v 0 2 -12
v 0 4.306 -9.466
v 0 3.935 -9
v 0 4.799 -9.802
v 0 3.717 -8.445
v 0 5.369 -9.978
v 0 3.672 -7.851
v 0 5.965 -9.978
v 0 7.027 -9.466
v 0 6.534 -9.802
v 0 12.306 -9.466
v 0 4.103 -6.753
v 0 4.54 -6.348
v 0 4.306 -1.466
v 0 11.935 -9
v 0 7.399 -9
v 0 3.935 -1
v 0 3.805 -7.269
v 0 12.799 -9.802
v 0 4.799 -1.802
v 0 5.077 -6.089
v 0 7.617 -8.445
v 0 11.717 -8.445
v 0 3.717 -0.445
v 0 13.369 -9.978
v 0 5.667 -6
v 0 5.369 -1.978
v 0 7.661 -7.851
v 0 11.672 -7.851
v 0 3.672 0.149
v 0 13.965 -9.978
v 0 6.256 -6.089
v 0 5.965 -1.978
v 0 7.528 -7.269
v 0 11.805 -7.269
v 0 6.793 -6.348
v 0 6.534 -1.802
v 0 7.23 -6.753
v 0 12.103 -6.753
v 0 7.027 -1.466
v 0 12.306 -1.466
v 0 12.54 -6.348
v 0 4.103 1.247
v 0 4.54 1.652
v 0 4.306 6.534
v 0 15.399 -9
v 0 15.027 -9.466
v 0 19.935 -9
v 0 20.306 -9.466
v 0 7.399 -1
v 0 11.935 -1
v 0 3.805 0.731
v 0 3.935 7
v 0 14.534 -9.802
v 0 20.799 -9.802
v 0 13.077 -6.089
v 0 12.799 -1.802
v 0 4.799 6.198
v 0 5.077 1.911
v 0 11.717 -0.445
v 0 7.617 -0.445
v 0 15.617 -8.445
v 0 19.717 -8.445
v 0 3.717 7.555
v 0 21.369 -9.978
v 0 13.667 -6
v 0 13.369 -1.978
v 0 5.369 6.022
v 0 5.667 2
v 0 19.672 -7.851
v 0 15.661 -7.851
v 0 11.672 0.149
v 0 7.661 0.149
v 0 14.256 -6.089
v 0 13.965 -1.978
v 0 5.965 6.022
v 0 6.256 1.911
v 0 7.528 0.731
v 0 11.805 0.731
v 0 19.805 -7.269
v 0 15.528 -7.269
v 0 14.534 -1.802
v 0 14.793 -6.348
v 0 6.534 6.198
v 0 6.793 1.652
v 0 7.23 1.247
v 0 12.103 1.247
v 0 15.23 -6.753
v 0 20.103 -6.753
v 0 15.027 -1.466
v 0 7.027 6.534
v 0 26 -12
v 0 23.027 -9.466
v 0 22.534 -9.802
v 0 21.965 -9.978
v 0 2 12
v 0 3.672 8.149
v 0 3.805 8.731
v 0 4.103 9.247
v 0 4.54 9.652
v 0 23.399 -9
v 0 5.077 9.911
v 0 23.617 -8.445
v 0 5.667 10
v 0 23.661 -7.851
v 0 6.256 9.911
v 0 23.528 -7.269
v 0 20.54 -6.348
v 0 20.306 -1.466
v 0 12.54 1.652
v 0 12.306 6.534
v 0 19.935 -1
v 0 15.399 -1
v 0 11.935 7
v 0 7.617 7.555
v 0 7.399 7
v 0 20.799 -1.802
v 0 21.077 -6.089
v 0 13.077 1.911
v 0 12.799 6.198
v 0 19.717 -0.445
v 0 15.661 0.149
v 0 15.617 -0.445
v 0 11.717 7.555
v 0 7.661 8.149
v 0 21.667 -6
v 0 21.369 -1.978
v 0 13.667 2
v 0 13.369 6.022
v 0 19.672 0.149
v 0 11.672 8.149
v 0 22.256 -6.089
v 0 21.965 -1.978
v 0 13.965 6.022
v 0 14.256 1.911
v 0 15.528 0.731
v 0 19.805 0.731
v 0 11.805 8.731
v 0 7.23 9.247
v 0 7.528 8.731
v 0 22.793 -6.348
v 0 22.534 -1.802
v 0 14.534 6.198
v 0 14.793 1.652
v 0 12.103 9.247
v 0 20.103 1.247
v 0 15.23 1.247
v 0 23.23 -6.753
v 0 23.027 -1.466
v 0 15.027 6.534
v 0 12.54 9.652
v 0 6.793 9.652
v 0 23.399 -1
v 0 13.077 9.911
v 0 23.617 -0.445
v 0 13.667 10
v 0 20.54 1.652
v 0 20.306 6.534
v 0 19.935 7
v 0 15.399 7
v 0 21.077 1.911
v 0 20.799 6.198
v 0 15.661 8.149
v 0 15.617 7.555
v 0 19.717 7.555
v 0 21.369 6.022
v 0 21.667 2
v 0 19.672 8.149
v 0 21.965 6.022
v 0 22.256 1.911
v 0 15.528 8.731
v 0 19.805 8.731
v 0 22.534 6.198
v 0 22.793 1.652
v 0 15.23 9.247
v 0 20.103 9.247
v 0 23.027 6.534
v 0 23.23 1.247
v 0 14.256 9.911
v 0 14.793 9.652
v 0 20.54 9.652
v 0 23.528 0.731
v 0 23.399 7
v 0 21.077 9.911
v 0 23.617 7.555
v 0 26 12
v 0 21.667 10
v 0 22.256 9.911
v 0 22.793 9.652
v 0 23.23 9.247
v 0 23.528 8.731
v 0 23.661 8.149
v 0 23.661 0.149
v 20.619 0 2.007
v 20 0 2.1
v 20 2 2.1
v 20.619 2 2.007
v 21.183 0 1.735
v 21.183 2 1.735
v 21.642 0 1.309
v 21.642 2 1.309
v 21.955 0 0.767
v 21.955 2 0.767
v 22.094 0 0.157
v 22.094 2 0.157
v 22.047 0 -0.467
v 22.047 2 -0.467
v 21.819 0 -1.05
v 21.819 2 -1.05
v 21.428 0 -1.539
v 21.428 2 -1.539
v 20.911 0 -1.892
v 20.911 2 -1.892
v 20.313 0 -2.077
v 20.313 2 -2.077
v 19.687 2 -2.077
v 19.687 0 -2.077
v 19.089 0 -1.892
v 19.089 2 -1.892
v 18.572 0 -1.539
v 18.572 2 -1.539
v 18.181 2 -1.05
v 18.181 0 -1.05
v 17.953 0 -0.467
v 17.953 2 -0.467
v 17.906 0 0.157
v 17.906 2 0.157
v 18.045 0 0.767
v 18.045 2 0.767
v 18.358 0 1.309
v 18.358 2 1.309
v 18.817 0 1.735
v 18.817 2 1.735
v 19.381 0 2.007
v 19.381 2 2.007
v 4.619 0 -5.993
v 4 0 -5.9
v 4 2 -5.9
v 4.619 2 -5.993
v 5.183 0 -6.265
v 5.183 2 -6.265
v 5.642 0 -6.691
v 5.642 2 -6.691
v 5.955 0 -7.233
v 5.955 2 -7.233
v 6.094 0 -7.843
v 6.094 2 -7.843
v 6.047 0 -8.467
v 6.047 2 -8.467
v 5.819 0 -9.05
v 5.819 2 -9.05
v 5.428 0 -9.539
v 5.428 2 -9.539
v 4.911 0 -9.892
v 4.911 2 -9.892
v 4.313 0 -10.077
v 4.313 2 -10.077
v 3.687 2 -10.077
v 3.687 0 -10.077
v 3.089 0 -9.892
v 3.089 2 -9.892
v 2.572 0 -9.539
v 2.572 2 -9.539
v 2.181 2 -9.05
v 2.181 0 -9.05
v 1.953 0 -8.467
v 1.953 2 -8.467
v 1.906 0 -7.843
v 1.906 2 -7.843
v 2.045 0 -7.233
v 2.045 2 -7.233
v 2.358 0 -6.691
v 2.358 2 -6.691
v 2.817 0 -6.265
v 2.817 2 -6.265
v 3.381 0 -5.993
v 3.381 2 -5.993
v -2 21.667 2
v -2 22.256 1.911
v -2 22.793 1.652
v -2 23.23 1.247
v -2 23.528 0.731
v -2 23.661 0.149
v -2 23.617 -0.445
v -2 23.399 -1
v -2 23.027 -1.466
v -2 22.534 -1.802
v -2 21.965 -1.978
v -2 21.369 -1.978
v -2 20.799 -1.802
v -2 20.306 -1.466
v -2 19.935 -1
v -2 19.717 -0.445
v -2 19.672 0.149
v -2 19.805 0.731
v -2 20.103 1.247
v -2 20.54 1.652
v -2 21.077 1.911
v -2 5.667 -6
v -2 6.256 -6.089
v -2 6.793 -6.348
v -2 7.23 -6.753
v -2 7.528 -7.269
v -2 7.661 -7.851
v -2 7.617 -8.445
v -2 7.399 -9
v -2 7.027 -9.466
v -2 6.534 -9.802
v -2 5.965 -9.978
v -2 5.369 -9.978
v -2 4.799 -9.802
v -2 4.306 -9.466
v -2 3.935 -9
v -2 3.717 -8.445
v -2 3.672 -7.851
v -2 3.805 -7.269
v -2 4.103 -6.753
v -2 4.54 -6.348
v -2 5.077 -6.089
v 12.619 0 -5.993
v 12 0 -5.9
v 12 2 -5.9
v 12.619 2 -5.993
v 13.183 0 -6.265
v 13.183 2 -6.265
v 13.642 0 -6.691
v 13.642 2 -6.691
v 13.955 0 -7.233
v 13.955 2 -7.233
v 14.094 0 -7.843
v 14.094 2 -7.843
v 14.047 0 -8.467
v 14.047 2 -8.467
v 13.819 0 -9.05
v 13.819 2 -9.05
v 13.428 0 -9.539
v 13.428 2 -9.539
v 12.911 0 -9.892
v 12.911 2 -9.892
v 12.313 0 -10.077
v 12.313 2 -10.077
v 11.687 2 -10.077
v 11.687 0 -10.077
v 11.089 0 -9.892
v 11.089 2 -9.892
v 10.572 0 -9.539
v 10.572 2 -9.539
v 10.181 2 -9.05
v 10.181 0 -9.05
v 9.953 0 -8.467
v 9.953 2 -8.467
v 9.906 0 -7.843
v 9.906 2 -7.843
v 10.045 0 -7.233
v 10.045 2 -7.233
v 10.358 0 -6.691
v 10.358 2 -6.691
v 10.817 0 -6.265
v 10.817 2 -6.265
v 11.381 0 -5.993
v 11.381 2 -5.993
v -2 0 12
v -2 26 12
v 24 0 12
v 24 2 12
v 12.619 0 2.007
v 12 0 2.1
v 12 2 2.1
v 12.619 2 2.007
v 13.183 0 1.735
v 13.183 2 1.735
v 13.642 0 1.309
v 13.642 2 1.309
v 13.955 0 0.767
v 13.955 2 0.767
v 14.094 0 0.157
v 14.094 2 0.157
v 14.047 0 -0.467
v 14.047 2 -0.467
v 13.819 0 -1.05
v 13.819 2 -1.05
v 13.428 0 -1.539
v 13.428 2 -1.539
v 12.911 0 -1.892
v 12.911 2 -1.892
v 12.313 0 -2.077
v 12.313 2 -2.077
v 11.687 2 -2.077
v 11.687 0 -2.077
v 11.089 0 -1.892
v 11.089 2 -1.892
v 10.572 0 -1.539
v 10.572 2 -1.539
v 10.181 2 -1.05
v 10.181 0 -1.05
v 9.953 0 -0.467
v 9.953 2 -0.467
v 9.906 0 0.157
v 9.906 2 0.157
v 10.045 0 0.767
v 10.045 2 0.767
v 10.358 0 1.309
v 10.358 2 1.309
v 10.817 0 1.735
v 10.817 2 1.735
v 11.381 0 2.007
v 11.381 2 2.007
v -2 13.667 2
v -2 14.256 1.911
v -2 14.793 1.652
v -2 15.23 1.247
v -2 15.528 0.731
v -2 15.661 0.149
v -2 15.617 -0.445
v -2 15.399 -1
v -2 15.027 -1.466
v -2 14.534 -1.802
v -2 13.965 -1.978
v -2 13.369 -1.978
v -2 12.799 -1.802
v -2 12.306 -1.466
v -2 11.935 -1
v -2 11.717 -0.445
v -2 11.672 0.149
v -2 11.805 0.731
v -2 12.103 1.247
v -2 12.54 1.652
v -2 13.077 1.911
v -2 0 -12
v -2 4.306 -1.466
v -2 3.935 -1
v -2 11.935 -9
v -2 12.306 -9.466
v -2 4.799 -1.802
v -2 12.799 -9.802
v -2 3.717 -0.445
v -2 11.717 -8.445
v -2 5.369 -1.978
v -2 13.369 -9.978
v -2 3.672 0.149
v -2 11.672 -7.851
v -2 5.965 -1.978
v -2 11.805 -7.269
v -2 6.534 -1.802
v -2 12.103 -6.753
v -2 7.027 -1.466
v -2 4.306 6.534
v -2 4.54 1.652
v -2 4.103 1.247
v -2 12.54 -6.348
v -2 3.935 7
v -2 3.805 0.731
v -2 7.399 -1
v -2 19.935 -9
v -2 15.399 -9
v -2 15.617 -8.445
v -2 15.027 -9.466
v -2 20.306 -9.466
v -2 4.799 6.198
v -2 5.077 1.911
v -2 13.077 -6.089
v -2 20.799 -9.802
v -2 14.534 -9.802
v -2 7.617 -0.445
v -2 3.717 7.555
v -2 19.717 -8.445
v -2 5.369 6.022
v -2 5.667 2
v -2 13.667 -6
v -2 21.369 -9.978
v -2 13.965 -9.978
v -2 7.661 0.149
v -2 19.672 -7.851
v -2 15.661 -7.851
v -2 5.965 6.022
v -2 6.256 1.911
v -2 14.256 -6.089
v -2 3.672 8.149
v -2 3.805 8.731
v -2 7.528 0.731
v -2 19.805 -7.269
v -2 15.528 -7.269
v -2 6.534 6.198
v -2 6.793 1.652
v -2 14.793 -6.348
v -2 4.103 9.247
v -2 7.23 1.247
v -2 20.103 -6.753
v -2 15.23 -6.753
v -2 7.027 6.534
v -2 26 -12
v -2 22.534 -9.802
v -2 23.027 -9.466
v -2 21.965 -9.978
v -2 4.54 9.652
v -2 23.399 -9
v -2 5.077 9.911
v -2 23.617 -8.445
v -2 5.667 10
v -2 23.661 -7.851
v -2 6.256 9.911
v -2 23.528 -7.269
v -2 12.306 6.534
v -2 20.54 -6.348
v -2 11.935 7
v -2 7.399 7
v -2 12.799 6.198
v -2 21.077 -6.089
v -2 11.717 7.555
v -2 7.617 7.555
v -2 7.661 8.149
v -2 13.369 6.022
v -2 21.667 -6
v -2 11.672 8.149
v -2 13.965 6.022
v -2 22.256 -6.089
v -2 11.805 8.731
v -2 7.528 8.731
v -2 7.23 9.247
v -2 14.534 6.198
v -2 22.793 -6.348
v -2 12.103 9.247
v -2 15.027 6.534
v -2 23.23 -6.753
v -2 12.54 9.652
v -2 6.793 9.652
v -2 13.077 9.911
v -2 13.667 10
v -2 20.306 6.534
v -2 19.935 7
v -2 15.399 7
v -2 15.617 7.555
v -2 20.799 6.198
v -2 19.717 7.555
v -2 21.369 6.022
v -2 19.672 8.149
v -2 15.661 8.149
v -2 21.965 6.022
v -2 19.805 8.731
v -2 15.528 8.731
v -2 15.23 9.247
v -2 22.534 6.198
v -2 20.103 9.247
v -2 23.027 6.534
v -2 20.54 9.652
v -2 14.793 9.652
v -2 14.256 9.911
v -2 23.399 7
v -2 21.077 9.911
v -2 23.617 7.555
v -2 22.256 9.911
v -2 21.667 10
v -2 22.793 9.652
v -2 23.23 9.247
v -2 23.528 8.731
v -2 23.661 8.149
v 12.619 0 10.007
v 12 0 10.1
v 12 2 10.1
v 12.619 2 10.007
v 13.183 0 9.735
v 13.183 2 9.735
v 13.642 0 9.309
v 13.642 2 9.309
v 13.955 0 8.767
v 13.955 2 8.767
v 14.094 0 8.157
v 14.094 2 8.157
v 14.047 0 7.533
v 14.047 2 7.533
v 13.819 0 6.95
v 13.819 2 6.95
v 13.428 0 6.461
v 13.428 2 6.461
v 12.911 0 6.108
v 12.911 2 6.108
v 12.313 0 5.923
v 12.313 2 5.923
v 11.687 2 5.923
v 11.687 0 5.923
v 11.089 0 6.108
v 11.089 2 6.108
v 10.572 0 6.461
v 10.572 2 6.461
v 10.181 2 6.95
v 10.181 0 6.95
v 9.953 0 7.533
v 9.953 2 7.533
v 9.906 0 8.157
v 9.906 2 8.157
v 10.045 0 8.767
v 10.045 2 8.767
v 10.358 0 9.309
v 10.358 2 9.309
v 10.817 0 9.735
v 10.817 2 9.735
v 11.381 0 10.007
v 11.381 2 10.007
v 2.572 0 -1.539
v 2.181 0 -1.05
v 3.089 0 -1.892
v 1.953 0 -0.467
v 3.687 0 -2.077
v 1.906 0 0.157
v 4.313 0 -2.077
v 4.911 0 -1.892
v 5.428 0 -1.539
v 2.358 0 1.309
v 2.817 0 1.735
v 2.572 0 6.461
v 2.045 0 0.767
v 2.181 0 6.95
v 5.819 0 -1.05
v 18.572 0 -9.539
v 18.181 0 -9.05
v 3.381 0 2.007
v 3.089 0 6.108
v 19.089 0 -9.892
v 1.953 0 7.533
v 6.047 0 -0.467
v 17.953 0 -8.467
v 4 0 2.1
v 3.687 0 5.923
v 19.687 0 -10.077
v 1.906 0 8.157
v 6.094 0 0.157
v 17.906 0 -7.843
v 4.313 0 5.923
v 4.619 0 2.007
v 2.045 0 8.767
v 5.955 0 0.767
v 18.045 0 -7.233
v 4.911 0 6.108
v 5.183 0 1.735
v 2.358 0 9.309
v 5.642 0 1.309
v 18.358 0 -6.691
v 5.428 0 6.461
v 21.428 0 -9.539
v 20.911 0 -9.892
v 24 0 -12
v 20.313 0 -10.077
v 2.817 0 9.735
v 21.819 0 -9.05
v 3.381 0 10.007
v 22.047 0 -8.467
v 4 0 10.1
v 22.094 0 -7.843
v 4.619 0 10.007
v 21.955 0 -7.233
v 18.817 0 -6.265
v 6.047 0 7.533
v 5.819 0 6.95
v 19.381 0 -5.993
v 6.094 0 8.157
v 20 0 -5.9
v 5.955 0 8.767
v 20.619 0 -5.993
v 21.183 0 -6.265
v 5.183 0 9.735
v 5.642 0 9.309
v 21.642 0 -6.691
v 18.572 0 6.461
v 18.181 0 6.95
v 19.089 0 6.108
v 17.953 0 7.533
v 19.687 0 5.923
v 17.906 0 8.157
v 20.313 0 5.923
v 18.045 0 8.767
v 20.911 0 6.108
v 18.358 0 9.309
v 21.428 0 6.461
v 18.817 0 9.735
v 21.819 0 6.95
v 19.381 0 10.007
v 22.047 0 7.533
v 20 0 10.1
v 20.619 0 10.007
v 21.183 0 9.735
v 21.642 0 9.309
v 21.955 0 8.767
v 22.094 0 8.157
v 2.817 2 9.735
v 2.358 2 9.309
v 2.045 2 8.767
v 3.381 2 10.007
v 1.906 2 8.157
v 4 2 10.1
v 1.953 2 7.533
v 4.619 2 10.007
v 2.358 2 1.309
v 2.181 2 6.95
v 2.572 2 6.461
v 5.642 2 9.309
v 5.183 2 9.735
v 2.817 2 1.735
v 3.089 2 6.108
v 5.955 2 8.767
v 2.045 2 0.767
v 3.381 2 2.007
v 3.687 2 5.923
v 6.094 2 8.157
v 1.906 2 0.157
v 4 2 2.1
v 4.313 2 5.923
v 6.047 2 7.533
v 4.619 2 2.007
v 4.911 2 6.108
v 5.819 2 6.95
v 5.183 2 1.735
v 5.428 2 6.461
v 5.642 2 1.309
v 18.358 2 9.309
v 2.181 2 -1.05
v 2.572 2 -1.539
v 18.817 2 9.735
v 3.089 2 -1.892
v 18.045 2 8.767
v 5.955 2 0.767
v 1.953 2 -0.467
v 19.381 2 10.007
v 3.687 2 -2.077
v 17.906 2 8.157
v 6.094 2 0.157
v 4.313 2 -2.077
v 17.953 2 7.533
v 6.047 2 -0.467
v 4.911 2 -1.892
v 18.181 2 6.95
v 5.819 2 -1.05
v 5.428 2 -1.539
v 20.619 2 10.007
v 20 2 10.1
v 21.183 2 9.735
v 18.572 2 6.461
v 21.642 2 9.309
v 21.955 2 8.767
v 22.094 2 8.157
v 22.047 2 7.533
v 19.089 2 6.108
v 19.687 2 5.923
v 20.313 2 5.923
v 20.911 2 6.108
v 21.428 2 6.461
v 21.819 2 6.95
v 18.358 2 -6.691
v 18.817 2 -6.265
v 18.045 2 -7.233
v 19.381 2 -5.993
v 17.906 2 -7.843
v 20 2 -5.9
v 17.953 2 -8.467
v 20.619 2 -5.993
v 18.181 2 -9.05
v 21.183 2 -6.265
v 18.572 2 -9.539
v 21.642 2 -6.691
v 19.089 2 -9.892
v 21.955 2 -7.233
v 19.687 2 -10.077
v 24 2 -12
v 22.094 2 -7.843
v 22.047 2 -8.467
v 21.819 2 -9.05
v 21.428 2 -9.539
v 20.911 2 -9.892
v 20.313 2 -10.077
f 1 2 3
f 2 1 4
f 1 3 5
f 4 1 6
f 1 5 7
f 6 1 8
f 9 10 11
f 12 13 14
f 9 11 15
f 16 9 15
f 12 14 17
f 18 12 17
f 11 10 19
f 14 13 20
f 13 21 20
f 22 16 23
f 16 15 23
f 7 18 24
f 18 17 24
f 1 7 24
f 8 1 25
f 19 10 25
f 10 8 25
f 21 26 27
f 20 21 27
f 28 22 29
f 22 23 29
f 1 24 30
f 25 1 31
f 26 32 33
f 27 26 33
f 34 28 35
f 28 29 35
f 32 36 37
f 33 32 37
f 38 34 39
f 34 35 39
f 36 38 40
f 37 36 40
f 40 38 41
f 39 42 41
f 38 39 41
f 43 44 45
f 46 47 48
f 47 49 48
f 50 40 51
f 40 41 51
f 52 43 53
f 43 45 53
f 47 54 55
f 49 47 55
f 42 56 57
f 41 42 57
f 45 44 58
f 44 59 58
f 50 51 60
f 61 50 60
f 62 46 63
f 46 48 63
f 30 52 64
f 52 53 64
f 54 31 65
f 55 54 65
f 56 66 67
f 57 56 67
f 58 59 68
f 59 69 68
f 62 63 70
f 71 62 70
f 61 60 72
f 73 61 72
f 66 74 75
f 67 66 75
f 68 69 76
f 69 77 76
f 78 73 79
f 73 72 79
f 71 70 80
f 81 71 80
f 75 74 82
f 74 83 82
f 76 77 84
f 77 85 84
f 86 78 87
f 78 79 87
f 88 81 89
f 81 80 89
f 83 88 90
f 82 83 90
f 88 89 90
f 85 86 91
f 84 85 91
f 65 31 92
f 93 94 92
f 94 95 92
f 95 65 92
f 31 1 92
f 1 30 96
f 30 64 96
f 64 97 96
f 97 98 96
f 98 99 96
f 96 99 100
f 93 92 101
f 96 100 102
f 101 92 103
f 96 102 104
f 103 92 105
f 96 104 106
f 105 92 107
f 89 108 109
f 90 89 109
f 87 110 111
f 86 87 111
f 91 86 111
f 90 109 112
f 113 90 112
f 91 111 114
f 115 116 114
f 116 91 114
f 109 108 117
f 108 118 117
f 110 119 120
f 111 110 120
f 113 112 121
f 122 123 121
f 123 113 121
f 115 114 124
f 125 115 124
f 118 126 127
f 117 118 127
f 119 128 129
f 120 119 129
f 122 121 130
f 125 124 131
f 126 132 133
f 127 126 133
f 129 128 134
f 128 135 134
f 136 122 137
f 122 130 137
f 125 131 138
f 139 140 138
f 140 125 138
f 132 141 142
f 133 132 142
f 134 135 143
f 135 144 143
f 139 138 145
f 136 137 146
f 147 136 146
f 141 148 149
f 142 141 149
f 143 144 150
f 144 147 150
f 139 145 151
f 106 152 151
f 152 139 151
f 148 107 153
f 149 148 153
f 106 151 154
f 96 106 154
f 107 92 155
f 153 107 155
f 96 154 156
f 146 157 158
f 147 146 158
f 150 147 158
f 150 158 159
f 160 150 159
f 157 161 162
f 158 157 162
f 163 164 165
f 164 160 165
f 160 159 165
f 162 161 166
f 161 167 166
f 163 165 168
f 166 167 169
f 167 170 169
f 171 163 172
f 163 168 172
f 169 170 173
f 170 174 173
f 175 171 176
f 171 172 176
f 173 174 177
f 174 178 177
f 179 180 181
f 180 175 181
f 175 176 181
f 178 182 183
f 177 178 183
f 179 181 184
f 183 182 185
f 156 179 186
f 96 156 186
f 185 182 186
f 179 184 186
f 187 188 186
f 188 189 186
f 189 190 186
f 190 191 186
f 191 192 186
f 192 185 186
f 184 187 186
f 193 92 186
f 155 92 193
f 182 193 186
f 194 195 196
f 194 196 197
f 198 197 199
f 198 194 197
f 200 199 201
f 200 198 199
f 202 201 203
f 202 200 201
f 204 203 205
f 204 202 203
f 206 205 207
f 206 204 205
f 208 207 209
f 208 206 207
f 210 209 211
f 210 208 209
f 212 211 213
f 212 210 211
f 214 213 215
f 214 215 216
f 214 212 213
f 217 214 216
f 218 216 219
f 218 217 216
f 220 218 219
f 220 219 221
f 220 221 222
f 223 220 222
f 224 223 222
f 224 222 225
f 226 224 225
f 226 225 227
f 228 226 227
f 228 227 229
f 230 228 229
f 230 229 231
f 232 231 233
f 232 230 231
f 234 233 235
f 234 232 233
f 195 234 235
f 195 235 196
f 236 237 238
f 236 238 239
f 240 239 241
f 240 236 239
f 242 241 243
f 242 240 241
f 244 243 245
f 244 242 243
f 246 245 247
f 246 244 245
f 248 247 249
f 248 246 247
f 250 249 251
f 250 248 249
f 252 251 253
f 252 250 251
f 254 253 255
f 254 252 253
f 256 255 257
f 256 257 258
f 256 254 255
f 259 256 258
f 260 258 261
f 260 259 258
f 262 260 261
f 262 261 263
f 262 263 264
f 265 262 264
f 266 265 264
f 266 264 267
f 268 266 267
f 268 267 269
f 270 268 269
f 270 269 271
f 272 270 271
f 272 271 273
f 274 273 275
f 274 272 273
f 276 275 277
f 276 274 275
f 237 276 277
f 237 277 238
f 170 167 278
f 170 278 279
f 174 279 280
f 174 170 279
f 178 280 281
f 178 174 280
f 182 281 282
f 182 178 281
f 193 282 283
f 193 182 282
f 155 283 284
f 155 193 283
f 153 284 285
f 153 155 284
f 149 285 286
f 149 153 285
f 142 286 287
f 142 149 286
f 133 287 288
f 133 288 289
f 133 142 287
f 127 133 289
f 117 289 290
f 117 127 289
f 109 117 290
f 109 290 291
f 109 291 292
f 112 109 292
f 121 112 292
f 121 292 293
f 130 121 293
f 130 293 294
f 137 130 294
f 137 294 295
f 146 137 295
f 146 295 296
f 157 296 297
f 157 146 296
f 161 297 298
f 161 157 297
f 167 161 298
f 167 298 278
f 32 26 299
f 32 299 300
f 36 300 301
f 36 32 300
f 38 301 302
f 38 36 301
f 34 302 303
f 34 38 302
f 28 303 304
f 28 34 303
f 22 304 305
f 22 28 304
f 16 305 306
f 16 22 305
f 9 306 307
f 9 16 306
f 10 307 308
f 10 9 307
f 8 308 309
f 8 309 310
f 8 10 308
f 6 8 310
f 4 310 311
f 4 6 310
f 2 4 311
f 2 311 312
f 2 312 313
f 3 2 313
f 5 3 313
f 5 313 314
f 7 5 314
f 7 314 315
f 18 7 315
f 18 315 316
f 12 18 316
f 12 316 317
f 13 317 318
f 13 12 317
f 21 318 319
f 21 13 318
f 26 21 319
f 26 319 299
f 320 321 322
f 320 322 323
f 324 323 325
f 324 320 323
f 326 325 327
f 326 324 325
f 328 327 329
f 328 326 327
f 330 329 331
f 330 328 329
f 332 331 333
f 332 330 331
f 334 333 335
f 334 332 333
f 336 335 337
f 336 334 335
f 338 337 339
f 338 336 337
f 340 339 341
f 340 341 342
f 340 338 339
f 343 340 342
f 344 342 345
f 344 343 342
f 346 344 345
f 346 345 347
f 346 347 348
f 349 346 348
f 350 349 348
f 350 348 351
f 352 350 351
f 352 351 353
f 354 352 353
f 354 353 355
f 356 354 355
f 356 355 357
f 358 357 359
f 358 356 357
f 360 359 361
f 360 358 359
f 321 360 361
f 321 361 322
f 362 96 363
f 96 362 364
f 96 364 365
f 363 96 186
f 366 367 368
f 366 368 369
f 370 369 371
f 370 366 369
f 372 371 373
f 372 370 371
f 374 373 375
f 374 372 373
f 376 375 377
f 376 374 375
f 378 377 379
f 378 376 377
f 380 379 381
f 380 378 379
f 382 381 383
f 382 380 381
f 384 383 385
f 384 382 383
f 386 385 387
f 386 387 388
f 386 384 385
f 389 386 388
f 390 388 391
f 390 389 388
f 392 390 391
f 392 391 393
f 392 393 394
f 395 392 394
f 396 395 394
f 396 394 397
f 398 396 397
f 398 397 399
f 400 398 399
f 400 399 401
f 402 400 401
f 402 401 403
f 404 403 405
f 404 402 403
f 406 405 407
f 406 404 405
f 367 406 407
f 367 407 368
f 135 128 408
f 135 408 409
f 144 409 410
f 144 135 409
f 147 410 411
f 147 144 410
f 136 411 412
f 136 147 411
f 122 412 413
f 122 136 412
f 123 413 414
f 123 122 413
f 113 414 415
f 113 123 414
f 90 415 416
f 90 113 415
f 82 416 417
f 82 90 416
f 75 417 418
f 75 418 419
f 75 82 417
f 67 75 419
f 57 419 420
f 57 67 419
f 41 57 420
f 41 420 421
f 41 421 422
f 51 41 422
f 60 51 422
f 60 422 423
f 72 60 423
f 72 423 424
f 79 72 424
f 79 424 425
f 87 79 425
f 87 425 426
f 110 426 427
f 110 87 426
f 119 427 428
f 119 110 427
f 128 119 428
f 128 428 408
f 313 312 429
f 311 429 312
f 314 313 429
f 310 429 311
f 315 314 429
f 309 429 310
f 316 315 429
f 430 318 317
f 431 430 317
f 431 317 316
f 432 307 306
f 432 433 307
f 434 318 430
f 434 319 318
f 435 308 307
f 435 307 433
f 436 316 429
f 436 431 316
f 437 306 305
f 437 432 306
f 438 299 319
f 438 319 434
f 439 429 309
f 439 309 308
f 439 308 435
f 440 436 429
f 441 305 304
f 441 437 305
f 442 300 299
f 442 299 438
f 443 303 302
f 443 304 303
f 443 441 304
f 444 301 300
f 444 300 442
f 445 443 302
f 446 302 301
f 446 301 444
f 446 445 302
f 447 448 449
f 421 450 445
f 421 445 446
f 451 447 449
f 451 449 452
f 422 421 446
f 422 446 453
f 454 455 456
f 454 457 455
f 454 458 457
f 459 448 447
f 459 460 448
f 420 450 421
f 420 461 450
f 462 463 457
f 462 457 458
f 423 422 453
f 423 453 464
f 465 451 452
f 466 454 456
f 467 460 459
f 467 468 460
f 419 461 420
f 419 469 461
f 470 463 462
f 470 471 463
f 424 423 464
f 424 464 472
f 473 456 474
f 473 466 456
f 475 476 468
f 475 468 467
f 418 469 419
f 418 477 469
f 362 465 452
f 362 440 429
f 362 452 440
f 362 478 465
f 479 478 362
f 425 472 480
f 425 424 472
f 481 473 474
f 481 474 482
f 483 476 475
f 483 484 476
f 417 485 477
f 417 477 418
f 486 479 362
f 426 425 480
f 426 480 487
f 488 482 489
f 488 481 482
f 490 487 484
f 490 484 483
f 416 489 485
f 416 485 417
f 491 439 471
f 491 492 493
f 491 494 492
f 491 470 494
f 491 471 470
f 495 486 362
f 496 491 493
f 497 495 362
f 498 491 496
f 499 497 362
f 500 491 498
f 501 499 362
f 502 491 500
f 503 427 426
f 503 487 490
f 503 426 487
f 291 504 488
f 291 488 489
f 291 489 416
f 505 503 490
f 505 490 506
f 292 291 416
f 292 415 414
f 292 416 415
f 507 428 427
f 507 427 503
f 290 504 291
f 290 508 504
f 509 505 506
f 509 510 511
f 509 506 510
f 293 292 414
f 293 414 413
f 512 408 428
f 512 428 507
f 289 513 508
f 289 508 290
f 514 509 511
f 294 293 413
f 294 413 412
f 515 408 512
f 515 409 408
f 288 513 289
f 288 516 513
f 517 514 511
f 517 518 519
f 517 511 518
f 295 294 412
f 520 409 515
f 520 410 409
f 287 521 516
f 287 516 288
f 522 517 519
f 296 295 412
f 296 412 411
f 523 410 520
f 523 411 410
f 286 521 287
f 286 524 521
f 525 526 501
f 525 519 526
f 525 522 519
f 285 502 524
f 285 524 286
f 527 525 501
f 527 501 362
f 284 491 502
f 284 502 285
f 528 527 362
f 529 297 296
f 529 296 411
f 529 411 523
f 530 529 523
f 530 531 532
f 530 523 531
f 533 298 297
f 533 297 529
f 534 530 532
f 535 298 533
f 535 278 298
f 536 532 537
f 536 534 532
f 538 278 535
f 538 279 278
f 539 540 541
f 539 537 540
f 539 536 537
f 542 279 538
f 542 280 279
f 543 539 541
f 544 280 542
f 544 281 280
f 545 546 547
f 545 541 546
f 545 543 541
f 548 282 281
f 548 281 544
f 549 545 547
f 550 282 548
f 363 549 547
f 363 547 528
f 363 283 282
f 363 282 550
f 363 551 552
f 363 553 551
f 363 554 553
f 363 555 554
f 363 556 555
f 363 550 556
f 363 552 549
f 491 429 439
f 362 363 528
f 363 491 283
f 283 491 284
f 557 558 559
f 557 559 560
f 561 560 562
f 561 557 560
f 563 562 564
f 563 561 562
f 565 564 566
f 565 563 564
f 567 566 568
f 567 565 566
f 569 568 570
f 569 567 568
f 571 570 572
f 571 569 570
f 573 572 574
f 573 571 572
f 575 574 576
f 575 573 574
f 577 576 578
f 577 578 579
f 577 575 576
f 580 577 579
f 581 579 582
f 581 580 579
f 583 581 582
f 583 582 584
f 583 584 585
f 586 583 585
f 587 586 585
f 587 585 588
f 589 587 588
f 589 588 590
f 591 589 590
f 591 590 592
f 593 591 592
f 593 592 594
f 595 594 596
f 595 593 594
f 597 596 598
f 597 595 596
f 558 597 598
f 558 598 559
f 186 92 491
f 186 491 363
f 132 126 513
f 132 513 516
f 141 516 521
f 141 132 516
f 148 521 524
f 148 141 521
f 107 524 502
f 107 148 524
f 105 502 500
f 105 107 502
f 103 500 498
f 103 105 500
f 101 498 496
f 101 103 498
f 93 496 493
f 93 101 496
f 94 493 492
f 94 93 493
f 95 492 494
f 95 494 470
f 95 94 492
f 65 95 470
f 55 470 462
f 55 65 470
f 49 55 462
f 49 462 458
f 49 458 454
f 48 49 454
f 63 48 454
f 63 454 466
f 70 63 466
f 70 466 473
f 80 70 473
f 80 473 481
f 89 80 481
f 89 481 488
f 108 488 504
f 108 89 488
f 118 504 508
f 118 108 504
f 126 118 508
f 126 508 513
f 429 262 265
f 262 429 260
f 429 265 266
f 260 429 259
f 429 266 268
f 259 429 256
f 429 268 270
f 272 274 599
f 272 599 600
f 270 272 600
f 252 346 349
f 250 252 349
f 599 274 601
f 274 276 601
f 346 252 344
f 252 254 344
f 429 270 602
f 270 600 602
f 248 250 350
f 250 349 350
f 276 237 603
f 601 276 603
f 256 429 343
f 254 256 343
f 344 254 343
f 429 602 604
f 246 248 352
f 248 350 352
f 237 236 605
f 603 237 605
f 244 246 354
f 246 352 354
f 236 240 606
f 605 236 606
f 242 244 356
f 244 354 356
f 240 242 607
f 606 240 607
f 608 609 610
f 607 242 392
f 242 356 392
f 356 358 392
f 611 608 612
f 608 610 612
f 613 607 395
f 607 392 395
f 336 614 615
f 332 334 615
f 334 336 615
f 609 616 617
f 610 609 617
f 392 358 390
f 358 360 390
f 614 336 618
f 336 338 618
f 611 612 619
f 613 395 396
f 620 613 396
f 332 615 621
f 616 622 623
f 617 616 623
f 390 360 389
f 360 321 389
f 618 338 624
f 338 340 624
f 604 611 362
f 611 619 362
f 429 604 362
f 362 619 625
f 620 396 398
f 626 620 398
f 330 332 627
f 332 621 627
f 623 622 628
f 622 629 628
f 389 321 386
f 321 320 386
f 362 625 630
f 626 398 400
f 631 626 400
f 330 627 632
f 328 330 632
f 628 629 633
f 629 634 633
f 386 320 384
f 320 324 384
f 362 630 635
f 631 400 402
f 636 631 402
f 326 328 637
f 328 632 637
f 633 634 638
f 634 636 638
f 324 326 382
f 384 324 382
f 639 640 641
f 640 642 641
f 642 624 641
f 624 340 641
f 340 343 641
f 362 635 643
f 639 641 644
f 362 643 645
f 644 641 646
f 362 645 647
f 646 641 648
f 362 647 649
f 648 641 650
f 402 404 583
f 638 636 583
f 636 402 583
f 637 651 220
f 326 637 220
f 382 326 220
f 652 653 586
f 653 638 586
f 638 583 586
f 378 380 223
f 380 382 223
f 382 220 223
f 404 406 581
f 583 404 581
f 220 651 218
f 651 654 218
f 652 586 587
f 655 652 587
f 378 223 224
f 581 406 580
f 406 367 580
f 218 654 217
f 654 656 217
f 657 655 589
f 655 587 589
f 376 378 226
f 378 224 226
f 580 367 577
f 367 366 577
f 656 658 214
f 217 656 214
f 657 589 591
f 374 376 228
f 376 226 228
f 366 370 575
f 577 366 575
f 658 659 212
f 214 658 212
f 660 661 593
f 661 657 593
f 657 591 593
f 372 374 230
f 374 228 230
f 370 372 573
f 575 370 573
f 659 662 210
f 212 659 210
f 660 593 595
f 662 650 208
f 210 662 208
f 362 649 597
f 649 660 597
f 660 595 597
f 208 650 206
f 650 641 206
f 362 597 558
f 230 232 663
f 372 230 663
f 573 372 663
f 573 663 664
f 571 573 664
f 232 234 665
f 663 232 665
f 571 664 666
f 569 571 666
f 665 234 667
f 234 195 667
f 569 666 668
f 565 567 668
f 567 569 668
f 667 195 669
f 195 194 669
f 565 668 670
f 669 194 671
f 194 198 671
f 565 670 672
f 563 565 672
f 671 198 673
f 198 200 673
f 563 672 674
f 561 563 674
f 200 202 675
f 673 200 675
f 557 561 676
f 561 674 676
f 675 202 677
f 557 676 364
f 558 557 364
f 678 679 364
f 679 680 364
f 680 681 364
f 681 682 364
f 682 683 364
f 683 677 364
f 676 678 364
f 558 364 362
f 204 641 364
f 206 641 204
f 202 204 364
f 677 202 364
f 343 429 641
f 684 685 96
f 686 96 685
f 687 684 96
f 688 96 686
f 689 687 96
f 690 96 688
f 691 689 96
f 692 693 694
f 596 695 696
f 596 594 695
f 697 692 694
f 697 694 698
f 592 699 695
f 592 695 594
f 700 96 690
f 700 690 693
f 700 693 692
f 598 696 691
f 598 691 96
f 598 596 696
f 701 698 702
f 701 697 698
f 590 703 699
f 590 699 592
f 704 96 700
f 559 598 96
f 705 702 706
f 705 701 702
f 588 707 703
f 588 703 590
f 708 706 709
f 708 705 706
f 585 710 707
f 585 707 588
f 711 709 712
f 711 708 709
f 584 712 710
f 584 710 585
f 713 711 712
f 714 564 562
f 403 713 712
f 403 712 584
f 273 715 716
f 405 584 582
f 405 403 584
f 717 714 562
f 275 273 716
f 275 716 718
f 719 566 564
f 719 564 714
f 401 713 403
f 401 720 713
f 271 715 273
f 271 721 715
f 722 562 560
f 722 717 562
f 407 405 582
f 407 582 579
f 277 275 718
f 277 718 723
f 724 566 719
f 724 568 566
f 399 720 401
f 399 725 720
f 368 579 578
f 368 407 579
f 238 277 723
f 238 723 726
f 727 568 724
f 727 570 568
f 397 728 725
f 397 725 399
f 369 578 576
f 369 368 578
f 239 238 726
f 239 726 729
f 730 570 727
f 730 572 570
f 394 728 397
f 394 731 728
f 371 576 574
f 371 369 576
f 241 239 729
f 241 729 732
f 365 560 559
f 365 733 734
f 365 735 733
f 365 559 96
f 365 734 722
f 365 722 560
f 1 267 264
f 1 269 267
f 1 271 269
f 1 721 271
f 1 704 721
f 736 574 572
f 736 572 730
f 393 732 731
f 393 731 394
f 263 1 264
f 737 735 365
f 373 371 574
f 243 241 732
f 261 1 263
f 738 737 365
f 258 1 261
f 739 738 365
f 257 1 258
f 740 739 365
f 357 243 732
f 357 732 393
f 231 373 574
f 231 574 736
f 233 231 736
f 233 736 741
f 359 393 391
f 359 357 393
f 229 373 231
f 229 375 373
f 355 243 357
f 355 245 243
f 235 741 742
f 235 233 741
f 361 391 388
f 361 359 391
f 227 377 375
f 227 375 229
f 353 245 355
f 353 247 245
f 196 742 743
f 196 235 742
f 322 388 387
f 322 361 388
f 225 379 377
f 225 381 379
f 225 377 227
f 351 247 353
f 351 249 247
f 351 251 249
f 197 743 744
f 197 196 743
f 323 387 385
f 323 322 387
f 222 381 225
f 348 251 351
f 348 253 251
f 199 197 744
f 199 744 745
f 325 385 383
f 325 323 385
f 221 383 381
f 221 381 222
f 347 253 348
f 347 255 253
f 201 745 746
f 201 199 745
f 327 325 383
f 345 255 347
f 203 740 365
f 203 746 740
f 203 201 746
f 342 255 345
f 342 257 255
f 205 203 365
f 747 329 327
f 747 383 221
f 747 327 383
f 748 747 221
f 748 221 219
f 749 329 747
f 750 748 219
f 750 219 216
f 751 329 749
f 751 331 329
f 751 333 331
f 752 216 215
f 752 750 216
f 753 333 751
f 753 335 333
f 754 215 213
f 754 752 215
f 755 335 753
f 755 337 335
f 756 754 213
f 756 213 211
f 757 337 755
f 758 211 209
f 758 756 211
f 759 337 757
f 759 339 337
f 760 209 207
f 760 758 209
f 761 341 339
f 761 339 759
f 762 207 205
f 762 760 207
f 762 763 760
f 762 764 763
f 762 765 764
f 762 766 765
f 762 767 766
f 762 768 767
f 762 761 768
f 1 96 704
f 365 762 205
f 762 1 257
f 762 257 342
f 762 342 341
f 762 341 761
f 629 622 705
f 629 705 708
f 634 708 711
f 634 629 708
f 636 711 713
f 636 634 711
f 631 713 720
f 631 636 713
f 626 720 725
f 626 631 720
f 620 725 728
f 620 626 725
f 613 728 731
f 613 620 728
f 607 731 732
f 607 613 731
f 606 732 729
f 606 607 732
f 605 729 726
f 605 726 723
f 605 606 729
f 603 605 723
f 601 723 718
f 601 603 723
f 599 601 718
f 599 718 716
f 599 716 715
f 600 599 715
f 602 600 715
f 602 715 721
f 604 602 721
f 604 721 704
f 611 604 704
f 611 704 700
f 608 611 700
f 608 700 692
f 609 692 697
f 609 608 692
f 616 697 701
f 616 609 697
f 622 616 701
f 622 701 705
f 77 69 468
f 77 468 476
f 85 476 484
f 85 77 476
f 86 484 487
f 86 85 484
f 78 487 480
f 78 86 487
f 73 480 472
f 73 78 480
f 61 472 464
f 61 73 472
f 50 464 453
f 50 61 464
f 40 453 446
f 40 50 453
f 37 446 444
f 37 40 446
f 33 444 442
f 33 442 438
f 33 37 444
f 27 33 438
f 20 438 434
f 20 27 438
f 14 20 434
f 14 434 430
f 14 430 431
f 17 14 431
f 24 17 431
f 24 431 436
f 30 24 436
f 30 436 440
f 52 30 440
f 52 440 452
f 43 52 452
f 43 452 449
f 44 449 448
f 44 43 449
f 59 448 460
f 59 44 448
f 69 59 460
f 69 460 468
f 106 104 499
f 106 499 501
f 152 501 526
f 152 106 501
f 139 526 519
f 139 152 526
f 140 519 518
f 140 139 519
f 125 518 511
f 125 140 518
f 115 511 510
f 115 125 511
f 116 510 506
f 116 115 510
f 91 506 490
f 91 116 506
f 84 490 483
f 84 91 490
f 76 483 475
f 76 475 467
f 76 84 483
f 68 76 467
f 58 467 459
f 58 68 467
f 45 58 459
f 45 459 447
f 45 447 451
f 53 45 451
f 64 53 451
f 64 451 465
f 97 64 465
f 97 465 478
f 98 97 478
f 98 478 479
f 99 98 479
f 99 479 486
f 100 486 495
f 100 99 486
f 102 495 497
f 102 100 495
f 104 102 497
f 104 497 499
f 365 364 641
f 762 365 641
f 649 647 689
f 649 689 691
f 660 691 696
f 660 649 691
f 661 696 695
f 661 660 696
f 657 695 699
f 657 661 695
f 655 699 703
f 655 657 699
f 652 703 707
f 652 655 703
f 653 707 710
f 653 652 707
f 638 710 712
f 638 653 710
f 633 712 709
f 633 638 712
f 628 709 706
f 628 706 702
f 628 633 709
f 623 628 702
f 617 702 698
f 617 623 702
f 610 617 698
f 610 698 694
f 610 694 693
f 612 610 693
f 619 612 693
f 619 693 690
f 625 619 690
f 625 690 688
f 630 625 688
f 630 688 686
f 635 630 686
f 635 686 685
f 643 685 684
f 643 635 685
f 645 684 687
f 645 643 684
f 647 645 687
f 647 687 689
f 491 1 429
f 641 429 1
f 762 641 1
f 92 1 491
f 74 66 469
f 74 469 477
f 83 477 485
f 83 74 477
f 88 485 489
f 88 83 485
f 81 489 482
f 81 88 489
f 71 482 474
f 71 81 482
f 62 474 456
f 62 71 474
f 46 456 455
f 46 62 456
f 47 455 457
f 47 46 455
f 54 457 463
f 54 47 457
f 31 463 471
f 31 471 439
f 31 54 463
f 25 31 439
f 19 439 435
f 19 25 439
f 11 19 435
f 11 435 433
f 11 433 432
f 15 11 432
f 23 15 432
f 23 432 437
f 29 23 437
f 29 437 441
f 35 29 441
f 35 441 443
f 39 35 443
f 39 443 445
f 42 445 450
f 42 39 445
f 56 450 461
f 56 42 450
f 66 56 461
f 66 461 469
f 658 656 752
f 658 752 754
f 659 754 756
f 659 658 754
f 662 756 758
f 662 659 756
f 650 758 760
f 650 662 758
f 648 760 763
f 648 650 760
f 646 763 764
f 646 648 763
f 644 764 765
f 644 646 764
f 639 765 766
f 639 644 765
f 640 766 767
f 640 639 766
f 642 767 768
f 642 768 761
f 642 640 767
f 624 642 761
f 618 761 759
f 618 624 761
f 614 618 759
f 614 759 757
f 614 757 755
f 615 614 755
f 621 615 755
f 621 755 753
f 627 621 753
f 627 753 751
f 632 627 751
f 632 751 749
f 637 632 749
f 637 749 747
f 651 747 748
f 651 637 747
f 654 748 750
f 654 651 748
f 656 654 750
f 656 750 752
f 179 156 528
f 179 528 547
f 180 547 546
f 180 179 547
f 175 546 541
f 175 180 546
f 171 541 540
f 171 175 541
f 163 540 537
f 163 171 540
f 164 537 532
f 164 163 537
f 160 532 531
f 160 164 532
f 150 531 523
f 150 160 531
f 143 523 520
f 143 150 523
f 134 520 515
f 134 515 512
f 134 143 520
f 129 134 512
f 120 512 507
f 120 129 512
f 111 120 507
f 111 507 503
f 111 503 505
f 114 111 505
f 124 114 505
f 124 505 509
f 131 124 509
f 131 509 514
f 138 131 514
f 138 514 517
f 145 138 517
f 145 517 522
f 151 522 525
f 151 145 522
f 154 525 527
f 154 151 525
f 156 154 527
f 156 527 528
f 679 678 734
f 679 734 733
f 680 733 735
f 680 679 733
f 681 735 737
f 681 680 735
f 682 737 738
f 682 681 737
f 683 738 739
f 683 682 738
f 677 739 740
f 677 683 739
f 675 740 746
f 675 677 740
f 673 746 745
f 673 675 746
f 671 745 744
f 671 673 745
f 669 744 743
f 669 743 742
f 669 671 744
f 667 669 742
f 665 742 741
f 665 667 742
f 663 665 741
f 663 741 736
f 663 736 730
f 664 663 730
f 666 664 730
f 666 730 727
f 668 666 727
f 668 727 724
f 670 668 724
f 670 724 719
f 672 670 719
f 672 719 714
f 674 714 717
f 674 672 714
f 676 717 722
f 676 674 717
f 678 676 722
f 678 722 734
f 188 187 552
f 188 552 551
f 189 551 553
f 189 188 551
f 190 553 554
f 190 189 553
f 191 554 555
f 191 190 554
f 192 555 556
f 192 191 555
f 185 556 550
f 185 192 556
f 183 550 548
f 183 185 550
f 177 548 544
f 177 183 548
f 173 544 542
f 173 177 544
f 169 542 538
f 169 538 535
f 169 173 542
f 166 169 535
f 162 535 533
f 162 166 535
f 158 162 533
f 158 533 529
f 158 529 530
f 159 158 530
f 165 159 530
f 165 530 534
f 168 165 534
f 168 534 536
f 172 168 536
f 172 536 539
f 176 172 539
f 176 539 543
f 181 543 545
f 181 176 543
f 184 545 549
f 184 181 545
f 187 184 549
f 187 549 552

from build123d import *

# Parameters (mm, degrees)
SKETCH1_W           = 24
SKETCH1_H           = 24
SKETCH1_R           = 2.1
BOSS_EXTRUDE1_DEPTH = 2
SKETCH2_W           = 24
SKETCH2_H           = 26
SKETCH2_R           = 2
BOSS_EXTRUDE2_DEPTH = 2


with BuildPart() as part:
    # Sketch1 → Boss-Extrude1 (new body)
    with BuildSketch(Plane(origin=(0, 0, 0), x_dir=(1, 0, 0), z_dir=(0, 1, 0))):
        with Locations((12, 0)):
            Rectangle(SKETCH1_W, SKETCH1_H)
        with Locations(Location((4, 8, 0), (0, 0, 270))):
            Circle(SKETCH1_R, mode=Mode.SUBTRACT)
        with Locations(Location((12, 8, 0), (0, 0, 270))):
            Circle(SKETCH1_R, mode=Mode.SUBTRACT)
        with Locations(Location((20, 8, 0), (0, 0, 270))):
            Circle(SKETCH1_R, mode=Mode.SUBTRACT)
        with Locations(Location((12, 0, 0), (0, 0, 270))):
            Circle(SKETCH1_R, mode=Mode.SUBTRACT)
        with Locations(Location((20, 0, 0), (0, 0, 270))):
            Circle(SKETCH1_R, mode=Mode.SUBTRACT)
        with Locations(Location((12, -8, 0), (0, 0, 270))):
            Circle(SKETCH1_R, mode=Mode.SUBTRACT)
        with Locations(Location((20, -8, 0), (0, 0, 270))):
            Circle(SKETCH1_R, mode=Mode.SUBTRACT)
        with Locations(Location((4, 0, 0), (0, 0, 270))):
            Circle(SKETCH1_R, mode=Mode.SUBTRACT)
        with Locations(Location((4, -8, 0), (0, 0, 270))):
            Circle(SKETCH1_R, mode=Mode.SUBTRACT)
    extrude(amount=BOSS_EXTRUDE1_DEPTH)

    # Sketch2 → Boss-Extrude2 (add)
    with BuildSketch(Plane.ZY):
        with Locations((0, 13)):
            Rectangle(SKETCH2_W, SKETCH2_H)
        with Locations((-8, 21.666666667)):
            Circle(SKETCH2_R, mode=Mode.SUBTRACT)
        with Locations((0, 21.666666667)):
            Circle(SKETCH2_R, mode=Mode.SUBTRACT)
        with Locations((8, 21.666666667)):
            Circle(SKETCH2_R, mode=Mode.SUBTRACT)
        with Locations((0, 13.666666667)):
            Circle(SKETCH2_R, mode=Mode.SUBTRACT)
        with Locations((8, 13.666666667)):
            Circle(SKETCH2_R, mode=Mode.SUBTRACT)
        with Locations((0, 5.666666667)):
            Circle(SKETCH2_R, mode=Mode.SUBTRACT)
        with Locations((8, 5.666666667)):
            Circle(SKETCH2_R, mode=Mode.SUBTRACT)
        with Locations((-8, 13.666666667)):
            Circle(SKETCH2_R, mode=Mode.SUBTRACT)
        with Locations((-8, 5.666666667)):
            Circle(SKETCH2_R, mode=Mode.SUBTRACT)
    extrude(amount=BOSS_EXTRUDE2_DEPTH)


solid = part.part
